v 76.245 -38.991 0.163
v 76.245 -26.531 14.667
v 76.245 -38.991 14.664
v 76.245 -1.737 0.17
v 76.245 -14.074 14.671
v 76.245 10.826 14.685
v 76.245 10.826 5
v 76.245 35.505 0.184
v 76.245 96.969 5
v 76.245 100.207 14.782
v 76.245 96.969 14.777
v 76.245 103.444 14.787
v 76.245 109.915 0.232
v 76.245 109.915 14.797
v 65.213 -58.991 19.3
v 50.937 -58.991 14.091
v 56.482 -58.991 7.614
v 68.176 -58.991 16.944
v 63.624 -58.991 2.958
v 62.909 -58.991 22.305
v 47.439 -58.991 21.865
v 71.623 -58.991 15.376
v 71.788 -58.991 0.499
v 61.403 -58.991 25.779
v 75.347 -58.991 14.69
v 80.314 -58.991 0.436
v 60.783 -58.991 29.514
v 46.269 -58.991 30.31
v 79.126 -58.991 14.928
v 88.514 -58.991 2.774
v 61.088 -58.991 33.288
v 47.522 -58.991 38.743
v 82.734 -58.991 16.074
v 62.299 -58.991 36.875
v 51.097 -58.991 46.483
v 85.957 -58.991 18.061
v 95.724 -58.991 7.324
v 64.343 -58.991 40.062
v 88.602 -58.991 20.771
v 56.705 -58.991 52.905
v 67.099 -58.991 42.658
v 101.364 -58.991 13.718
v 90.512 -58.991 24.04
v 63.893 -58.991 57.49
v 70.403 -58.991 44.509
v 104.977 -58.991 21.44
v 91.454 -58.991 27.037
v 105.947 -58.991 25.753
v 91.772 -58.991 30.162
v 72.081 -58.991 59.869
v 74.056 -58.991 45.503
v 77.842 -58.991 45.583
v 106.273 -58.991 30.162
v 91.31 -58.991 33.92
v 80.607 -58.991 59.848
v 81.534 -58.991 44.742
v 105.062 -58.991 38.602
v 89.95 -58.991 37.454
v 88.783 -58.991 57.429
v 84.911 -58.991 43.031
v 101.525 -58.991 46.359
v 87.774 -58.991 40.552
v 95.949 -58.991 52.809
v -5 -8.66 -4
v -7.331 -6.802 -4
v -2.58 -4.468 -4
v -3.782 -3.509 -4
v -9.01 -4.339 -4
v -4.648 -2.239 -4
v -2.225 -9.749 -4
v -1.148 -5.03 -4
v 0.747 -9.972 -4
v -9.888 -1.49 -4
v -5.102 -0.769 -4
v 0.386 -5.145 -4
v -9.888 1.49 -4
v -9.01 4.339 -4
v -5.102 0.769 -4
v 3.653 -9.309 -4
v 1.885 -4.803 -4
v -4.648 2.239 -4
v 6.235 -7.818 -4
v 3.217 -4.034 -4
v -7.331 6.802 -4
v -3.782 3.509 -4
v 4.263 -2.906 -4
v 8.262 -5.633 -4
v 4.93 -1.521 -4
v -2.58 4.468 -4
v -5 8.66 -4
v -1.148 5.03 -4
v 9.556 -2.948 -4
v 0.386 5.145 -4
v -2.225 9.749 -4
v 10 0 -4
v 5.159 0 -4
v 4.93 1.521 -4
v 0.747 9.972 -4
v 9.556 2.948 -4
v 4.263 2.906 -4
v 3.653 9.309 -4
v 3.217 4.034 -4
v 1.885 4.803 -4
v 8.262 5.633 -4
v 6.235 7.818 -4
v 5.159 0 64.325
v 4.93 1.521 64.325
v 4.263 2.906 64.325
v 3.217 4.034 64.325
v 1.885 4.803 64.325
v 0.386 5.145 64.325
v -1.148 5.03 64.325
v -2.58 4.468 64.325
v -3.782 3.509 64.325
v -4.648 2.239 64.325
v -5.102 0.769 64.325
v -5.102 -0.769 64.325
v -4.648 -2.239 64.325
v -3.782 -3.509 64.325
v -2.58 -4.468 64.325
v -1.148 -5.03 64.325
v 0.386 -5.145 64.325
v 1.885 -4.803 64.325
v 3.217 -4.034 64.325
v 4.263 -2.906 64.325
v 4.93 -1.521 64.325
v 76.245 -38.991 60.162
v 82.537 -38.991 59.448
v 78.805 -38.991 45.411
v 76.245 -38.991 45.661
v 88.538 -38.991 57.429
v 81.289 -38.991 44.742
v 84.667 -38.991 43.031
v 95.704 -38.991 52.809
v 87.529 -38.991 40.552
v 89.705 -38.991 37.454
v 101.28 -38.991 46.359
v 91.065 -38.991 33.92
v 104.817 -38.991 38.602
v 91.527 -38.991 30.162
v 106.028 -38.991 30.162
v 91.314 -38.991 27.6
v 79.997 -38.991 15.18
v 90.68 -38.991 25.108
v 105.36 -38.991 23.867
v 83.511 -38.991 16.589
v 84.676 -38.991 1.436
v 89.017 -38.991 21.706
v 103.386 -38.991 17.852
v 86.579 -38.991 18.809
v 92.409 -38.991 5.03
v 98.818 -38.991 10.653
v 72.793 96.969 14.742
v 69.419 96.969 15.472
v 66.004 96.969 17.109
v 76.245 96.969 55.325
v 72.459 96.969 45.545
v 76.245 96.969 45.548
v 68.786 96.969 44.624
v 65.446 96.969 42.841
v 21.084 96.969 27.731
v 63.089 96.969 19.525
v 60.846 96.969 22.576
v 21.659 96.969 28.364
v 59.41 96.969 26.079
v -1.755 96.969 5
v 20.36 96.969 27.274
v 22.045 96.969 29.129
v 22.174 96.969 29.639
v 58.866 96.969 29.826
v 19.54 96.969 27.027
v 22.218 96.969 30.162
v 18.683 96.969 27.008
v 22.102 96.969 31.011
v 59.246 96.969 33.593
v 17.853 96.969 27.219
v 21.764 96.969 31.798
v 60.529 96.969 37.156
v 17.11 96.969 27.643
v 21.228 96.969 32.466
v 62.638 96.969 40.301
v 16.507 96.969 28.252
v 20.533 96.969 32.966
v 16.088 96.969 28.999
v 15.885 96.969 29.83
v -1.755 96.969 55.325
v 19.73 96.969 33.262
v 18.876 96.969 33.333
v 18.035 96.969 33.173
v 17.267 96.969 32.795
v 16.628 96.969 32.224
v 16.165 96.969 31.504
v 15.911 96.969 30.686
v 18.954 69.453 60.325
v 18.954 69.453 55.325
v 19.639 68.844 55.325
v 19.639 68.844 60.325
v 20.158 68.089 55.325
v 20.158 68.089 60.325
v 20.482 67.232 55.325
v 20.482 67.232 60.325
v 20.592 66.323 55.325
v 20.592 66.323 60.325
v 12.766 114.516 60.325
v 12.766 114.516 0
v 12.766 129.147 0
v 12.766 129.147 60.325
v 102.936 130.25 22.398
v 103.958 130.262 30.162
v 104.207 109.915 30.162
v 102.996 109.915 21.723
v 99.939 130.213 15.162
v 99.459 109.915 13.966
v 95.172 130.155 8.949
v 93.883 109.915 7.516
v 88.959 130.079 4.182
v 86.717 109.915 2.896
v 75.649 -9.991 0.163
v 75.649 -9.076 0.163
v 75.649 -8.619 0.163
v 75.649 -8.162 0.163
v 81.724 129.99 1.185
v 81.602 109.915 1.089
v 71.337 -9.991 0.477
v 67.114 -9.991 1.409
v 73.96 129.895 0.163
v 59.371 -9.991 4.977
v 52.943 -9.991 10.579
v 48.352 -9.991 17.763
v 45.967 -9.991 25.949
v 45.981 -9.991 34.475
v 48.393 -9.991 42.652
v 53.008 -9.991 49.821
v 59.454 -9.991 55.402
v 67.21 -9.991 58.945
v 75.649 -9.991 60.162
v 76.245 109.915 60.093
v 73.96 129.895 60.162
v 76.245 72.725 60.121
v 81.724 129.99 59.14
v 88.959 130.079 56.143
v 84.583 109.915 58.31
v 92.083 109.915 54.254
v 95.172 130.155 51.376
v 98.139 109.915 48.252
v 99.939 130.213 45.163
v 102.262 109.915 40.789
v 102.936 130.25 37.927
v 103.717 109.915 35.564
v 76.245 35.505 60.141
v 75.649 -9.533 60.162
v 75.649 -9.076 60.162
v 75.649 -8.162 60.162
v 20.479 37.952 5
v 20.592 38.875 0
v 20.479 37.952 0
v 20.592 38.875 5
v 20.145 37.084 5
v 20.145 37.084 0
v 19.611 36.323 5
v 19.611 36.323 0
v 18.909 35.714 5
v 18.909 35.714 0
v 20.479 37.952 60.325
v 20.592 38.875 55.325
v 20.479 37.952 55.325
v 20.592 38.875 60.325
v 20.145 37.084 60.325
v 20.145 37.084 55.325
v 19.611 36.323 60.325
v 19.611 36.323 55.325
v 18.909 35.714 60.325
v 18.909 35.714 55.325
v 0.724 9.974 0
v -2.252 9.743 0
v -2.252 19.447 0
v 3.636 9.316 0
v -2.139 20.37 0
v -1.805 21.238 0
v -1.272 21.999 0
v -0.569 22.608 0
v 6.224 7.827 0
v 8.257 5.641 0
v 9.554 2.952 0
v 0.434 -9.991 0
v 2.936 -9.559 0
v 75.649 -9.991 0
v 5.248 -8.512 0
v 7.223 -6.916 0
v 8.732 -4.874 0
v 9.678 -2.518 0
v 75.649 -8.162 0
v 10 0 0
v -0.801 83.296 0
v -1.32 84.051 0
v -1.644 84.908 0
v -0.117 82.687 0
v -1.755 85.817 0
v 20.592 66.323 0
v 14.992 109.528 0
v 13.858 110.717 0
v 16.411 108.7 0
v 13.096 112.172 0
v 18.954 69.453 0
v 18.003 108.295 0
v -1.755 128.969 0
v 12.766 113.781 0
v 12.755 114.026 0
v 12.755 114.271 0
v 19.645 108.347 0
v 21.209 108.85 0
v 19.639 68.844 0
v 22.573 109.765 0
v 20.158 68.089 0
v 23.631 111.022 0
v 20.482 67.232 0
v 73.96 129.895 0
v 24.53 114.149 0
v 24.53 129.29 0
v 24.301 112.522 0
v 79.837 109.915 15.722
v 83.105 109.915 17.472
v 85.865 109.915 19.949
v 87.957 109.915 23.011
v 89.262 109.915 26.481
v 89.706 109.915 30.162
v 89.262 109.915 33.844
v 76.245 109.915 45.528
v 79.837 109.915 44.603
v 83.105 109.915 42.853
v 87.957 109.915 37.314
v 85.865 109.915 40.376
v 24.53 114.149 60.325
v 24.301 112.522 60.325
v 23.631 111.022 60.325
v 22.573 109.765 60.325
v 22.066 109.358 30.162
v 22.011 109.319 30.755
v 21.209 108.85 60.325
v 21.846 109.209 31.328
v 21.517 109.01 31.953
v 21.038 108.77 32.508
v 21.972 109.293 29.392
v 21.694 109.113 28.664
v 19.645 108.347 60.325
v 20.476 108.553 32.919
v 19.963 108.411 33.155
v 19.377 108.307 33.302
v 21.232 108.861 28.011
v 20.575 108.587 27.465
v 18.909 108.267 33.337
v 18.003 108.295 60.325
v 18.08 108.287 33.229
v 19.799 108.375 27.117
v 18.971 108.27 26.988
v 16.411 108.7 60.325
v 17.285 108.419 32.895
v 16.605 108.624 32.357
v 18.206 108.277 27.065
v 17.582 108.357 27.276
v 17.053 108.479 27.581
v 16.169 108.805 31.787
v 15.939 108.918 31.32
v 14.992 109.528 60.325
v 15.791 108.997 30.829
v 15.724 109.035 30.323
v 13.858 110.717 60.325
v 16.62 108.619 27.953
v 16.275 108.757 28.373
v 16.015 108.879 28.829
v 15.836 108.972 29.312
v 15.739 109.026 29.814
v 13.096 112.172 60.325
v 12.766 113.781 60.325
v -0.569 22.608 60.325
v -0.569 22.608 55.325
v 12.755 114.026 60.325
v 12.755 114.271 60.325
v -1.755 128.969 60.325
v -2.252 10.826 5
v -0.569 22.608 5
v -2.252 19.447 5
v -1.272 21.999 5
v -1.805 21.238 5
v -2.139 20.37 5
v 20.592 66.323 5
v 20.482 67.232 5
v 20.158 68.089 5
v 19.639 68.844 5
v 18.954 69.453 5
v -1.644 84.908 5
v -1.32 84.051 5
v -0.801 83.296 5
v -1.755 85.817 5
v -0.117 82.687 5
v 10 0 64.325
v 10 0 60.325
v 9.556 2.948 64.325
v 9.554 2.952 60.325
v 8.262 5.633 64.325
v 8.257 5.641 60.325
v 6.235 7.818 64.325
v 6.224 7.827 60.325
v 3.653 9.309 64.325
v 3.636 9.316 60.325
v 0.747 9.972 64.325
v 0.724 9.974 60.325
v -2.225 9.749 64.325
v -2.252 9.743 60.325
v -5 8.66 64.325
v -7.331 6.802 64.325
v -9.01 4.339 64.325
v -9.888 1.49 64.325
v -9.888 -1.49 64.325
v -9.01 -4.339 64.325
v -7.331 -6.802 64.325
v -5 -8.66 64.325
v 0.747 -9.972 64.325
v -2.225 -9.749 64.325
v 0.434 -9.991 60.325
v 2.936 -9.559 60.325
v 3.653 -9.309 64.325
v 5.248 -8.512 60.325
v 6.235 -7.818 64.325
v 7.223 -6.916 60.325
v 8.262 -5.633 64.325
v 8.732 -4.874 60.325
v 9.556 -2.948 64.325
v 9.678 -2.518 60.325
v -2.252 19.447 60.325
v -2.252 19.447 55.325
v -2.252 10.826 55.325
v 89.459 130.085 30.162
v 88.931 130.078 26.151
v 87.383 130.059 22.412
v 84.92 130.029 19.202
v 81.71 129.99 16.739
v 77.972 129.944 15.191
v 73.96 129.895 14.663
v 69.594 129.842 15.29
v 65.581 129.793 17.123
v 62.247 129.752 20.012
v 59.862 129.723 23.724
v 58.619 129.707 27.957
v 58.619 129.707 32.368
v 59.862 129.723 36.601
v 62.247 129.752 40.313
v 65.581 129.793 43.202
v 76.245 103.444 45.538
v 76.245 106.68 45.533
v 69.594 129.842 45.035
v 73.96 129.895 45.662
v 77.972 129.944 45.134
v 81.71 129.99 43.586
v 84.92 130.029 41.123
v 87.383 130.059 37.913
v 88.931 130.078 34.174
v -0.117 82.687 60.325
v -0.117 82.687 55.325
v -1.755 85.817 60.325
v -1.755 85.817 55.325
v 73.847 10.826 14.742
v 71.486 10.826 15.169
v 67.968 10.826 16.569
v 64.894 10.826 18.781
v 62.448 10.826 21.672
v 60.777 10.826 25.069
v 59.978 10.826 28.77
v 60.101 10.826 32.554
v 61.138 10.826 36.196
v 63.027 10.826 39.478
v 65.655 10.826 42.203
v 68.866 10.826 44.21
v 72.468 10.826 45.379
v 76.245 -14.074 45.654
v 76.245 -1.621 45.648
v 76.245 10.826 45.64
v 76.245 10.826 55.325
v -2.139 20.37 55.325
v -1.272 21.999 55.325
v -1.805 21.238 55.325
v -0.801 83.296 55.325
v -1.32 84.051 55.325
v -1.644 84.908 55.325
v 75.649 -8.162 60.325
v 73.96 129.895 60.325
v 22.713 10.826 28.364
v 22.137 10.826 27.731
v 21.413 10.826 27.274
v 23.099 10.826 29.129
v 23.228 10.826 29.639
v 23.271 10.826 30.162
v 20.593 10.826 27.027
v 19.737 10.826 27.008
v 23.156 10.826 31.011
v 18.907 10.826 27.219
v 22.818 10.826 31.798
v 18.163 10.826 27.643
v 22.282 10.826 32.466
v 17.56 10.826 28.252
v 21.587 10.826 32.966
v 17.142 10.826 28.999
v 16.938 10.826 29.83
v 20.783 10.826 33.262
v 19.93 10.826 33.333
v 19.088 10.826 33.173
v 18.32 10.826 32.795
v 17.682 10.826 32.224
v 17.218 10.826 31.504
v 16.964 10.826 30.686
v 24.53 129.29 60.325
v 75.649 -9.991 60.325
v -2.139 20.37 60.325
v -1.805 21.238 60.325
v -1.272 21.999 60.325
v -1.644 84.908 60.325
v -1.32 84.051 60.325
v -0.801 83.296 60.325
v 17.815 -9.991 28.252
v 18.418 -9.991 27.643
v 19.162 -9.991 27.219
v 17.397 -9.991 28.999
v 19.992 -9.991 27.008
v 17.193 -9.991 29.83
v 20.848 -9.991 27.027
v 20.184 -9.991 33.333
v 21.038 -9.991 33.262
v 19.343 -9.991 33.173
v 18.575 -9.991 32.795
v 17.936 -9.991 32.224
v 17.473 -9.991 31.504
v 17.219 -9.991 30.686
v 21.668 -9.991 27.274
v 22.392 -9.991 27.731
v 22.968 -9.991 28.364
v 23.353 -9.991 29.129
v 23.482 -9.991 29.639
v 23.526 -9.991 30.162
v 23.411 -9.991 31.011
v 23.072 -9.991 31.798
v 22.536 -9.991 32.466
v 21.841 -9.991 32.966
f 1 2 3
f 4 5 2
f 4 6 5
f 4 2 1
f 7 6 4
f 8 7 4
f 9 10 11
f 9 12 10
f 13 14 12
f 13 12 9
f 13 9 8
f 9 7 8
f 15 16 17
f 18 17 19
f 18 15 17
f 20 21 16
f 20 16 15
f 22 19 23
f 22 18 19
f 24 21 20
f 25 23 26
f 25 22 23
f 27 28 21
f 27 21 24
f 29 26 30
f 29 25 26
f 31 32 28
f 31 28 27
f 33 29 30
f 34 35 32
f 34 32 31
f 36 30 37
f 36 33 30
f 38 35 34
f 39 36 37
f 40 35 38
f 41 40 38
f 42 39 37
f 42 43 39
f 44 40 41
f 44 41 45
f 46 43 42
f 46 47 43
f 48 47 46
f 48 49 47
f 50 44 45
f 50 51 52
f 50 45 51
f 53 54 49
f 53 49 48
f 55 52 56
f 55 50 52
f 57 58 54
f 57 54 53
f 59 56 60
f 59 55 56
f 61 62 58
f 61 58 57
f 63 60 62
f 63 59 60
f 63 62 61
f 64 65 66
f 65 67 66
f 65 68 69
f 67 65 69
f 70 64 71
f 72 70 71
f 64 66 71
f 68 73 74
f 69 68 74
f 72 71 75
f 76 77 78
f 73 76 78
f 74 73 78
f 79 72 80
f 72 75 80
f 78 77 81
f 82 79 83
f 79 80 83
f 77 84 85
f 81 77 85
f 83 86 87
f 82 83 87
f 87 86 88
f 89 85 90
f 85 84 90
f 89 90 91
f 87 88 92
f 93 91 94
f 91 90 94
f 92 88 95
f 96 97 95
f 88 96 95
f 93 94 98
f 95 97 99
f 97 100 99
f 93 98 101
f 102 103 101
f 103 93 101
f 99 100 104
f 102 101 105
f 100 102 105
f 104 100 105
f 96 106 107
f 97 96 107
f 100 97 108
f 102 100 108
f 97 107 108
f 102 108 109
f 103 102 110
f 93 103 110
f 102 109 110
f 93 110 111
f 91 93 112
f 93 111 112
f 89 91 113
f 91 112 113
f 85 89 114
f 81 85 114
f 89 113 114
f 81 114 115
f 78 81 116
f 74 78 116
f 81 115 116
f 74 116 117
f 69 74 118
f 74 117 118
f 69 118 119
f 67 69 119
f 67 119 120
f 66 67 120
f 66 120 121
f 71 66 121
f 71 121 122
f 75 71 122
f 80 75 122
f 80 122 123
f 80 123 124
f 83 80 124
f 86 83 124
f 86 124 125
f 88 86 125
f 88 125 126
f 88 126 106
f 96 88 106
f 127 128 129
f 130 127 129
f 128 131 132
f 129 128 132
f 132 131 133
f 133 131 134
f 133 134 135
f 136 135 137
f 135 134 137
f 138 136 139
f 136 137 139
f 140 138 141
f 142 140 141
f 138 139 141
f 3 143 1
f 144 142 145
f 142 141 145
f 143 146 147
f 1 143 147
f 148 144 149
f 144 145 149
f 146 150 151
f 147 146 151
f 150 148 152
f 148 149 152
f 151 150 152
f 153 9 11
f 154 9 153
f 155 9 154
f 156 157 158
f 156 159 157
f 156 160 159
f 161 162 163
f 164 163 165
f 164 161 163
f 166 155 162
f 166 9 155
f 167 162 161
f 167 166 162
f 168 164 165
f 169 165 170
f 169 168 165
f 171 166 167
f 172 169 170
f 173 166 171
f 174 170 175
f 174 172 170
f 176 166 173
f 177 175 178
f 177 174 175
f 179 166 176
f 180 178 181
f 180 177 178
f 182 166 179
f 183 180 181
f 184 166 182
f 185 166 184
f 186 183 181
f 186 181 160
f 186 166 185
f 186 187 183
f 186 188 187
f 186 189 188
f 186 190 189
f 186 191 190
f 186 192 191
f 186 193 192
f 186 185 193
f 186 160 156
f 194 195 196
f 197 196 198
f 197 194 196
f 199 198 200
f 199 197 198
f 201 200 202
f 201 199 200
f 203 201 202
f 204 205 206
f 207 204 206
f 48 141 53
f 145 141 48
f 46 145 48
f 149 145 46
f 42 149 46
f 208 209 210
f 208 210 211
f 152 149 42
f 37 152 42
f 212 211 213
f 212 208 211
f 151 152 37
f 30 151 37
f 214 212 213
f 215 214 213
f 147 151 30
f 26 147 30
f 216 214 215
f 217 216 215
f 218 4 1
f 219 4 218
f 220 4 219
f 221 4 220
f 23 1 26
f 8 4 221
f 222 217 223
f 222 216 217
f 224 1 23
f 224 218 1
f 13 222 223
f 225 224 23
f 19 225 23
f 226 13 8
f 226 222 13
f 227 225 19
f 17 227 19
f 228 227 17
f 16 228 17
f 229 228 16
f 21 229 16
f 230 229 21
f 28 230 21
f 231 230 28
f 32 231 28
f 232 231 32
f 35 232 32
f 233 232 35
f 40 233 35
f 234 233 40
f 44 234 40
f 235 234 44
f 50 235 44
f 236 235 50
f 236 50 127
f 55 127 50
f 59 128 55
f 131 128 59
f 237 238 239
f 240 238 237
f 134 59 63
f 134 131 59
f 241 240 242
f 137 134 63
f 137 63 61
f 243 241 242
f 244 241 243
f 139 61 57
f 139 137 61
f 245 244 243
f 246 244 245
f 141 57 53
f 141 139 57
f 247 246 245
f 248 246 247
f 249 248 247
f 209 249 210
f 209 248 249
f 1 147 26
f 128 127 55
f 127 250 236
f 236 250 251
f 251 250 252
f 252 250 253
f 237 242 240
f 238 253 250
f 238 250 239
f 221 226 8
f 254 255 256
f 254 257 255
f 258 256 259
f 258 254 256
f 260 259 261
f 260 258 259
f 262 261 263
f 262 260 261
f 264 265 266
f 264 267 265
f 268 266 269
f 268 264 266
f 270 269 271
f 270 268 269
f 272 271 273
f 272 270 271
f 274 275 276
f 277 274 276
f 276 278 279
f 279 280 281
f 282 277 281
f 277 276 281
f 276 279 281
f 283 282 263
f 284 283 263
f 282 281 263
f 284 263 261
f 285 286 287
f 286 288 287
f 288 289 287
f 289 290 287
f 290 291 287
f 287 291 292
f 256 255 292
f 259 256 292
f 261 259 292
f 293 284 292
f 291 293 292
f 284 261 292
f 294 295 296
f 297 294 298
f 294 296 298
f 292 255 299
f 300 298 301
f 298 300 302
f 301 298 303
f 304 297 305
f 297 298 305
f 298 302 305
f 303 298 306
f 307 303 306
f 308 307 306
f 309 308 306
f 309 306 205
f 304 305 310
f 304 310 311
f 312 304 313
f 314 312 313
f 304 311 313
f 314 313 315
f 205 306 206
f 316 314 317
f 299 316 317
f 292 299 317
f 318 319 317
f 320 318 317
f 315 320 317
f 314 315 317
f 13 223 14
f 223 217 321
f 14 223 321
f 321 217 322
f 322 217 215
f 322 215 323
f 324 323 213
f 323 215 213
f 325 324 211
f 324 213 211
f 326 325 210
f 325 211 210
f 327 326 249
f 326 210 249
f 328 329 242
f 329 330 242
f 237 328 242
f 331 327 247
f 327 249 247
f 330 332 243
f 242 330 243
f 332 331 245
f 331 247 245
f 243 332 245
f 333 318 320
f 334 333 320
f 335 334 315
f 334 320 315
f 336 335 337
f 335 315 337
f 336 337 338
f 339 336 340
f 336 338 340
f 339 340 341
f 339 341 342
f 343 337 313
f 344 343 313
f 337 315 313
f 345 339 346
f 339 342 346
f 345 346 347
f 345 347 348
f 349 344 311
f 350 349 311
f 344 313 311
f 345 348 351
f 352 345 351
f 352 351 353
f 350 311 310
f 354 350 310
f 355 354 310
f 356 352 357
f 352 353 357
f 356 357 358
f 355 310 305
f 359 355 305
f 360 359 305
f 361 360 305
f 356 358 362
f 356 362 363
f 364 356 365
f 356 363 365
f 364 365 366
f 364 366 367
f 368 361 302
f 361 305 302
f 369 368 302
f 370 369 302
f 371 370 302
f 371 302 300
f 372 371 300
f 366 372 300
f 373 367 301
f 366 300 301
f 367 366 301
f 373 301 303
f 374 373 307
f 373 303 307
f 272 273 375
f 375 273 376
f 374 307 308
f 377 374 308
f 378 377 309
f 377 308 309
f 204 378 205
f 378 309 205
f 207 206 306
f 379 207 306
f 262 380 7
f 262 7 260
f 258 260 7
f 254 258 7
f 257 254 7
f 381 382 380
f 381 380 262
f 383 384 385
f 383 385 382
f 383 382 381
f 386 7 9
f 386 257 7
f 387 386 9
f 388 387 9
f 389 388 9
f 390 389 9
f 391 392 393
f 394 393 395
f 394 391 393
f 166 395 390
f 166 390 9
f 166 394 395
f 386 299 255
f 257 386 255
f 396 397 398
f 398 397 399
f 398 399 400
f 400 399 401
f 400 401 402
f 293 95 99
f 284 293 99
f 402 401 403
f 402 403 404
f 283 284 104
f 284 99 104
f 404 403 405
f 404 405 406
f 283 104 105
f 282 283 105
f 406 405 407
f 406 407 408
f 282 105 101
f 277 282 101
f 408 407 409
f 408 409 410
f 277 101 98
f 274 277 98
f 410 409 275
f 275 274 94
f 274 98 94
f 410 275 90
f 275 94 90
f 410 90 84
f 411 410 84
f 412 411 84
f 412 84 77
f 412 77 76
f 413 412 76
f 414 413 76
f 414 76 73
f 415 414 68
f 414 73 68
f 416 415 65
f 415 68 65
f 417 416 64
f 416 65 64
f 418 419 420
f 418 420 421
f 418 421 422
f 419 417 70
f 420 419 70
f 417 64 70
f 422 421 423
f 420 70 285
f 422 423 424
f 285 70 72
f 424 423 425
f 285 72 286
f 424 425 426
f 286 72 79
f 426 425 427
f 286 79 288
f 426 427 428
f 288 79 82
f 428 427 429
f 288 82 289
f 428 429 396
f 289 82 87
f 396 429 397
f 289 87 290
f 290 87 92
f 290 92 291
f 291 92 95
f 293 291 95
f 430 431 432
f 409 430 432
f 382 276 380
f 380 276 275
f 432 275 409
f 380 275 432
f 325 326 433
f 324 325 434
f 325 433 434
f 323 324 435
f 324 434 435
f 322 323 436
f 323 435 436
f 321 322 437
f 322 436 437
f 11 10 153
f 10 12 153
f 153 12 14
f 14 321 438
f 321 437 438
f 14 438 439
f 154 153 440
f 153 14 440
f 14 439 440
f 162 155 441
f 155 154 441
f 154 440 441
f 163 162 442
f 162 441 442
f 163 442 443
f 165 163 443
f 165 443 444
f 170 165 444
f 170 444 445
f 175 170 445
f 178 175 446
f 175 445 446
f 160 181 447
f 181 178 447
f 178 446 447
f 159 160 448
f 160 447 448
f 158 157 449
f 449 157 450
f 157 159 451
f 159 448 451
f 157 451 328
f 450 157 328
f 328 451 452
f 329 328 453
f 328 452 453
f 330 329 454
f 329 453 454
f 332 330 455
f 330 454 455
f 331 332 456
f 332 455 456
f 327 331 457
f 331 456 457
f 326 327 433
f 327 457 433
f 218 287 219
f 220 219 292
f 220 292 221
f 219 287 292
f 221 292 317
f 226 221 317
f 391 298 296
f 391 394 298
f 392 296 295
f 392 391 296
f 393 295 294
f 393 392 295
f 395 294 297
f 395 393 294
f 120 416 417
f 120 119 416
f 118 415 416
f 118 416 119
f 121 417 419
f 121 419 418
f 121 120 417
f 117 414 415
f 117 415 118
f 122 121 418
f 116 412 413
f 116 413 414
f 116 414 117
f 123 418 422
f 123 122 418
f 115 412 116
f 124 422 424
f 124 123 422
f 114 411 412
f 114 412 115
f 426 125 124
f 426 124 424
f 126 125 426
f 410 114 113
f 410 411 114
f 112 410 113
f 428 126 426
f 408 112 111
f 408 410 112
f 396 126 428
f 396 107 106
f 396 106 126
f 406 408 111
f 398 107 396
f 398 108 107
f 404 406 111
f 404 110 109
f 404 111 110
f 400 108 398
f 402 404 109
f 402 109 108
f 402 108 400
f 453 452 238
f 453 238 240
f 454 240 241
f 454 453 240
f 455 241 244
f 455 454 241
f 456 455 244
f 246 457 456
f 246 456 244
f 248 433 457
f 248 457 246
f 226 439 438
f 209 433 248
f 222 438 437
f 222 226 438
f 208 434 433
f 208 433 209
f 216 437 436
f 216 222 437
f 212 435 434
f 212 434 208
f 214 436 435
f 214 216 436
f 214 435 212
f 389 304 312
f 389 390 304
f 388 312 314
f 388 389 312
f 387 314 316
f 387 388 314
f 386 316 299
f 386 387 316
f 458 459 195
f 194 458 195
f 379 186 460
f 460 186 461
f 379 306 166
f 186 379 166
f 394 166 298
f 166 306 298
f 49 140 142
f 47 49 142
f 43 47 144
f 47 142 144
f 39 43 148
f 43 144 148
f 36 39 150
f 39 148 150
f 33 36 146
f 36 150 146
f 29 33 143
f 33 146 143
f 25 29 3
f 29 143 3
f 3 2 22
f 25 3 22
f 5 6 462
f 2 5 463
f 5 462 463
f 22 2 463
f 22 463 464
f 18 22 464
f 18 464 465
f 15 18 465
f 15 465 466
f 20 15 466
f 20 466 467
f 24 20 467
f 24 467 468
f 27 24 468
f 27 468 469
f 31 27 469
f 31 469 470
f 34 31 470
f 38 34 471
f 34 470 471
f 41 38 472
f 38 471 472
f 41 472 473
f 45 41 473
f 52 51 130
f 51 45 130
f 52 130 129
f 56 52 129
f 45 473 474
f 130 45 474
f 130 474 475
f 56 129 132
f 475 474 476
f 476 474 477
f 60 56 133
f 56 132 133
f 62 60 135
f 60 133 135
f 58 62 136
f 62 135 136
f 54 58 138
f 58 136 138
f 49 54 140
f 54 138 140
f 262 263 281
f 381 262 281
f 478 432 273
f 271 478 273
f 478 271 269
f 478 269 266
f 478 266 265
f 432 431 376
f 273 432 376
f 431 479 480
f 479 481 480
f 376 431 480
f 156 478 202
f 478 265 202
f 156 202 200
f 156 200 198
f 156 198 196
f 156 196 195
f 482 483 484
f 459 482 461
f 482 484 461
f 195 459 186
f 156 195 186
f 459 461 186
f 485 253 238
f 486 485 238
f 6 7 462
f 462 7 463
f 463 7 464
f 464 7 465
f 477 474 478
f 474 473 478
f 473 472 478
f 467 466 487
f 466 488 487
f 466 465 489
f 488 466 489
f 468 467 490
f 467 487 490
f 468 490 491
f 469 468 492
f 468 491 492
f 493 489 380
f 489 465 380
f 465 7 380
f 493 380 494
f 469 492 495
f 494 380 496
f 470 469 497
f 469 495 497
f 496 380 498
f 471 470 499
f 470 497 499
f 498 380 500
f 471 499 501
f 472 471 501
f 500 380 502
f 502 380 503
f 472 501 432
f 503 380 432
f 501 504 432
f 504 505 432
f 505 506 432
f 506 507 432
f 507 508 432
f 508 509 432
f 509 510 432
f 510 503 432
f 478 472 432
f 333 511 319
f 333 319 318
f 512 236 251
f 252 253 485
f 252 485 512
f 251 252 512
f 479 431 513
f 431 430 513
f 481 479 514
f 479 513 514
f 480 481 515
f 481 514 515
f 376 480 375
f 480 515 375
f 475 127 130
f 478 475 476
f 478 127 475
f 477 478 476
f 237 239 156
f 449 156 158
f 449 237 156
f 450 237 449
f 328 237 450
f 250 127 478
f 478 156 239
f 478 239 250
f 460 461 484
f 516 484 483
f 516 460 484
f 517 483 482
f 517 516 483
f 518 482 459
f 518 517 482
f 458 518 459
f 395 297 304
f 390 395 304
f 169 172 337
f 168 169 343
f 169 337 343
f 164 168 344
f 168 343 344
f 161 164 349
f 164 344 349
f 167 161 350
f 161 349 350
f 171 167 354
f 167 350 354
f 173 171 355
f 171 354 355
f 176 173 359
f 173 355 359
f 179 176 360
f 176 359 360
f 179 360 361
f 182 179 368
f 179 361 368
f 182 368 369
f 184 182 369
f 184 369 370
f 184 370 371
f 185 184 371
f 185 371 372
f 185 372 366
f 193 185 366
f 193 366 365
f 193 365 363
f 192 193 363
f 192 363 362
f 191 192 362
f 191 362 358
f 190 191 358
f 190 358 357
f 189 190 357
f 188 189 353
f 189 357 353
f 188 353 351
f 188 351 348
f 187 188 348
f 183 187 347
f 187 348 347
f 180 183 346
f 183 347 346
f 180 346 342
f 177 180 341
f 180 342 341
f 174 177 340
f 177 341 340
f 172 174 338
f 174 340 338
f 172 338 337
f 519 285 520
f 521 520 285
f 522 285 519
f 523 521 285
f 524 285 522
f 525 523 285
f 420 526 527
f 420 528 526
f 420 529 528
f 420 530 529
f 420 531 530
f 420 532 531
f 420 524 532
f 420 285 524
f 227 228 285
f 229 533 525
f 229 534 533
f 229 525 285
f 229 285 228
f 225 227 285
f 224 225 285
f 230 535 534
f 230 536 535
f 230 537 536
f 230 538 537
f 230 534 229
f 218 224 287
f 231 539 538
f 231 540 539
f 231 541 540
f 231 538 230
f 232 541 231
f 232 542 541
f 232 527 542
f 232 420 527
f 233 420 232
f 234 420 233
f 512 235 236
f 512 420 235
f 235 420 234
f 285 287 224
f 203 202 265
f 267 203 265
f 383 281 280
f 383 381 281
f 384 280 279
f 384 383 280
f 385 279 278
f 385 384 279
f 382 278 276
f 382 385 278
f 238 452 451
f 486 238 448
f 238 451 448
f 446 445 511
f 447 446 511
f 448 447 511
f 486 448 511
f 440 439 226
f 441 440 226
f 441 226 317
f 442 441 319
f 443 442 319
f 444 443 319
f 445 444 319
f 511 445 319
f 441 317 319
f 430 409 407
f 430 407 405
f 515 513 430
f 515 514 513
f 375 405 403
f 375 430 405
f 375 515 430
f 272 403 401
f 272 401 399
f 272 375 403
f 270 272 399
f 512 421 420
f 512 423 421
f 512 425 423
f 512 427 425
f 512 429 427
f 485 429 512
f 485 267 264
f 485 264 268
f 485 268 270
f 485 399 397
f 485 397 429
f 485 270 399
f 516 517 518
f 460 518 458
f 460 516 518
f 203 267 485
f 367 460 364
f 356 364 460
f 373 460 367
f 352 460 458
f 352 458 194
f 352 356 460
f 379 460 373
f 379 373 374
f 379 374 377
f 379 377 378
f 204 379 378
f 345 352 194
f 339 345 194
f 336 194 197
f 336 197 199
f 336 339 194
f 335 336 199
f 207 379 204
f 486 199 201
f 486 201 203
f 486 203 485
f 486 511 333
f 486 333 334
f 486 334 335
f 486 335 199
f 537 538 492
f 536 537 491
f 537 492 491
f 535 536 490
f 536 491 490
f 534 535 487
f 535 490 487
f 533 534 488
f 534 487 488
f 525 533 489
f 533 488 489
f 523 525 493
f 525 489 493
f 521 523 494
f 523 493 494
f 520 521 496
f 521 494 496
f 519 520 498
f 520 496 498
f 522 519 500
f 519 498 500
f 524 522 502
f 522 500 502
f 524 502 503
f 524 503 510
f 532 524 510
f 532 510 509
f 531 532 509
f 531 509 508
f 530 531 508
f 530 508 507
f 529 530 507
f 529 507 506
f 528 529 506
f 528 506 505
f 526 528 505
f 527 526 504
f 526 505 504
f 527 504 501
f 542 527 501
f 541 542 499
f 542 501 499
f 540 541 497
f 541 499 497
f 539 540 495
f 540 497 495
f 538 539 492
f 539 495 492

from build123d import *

# Parameters (mm, degrees)
BOSS_EXTRUDE1_DEPTH               = 60.325
BOSS_EXTRUDE2_START               = -64.325
SKETCH4_R                         = 10
BOSS_EXTRUDE2_DEPTH               = 68.325
SKETCH5_R                         = 5.159375
CUT_EXTRUDE1_DEPTH                = 69.325
SKETCH6_W                         = 75.649114878
SKETCH6_H                         = 60.325
BOSS_EXTRUDE3_DEPTH               = 1.8288
BOSS_EXTRUDE4_REACH               = 190.905
BOSS_EXTRUDE4_OFFSET_FROM_SURFACE = 49
SKETCH8_R                         = 30
SKETCH9_R                         = 15.5
CUT_EXTRUDE2_DEPTH                = 190.266787166
CUT_EXTRUDE3_DEPTH                = 49
SKETCH11_W                        = 50.325
SKETCH11_H                        = 86.143116626
CUT_EXTRUDE4_DEPTH                = 109.525496818
SKETCH15_R                        = 3.175
CUT_EXTRUDE5_DEPTH                = 190.266787166
FILLET1_R                         = 3.81


with BuildPart() as part:
    # Sketch2 → Boss-Extrude1 (new body)
    with BuildSketch(Plane.XY):
        with BuildLine():
            Line((12.765629792, 129.146573189), (-1.754589441, 128.968962917))
            Line((-1.754589441, 128.968962917), (-1.754589441, 83.82382539))
            Line((-1.754589441, 83.82382539), (20.592124083, 68.316599476))
            Line((20.592124083, 68.316599476), (20.592124083, 36.846052768))
            Line((20.592124083, 36.846052768), (-2.252403515, 21.475974179))
            Line((-2.252403515, 21.475974179), (-2.252403515, 12.414958495))
            Line((-2.252403515, 12.414958495), (-2.252403515, -8.161795964))
            Line((-2.252403515, -8.161795964), (75.649114878, -8.161795964))
            Line((75.649114878, -8.161795964), (73.96041286, 129.895103354))
            Line((73.96041286, 129.895103354), (24.530310461, 129.290477913))
            Line((24.530310461, 129.290477913), (24.530310461, 114.148644142))
            ThreePointArc((24.530310461, 114.148644142), (18.82597029, 108.263437866), (12.765629792, 113.781356201))
            ThreePointArc((12.765629792, 113.781356201), (12.754163231, 114.148644142), (12.765629792, 114.515932083))
            Line((12.765629792, 114.515932083), (12.765629792, 129.146573189))
        make_face()
    extrude(amount=BOSS_EXTRUDE1_DEPTH)

    # Sketch4 → Boss-Extrude2 (add)
    with BuildSketch(Plane.XY.offset(60.325).offset(BOSS_EXTRUDE2_START)):
        Circle(SKETCH4_R)
    extrude(amount=BOSS_EXTRUDE2_DEPTH)

    # Sketch5 → Cut-Extrude1 (cut, through all)
    with BuildSketch(Plane.XY.offset(64.325)):
        Circle(SKETCH5_R)
    extrude(amount=-CUT_EXTRUDE1_DEPTH, mode=Mode.SUBTRACT)

    # Sketch6 → Boss-Extrude3 (add)
    with BuildSketch(Plane.XZ.offset(8.161795964)):
        with Locations((37.824557439, 30.1625)):
            Rectangle(SKETCH6_W, SKETCH6_H)
    extrude(amount=BOSS_EXTRUDE3_DEPTH)

    # Boss-Extrude4: up to this face of the body (flat: up to its plane, moved by the offset)
    boss_extrude4_end = Plane(part.part.faces().sort_by_distance((38.041347827, -9.990595964, 30.1625))[0]).offset(BOSS_EXTRUDE4_OFFSET_FROM_SURFACE)
    # Sketch8 → Boss-Extrude4 (add, up to the picked face)
    with BuildSketch(Plane(origin=(-1.577565522, 128.97112826, 0), x_dir=(0.999925198, 0.012231013, 0), z_dir=(-0.012231013, 0.999925198, 0)), mode=Mode.PRIVATE) as boss_extrude4_sk1:
        with Locations((75.543629169, -30.1625)):
            Circle(SKETCH8_R)
    boss_extrude4_tool1 = split(extrude(boss_extrude4_sk1.sketch, amount=-BOSS_EXTRUDE4_REACH, mode=Mode.PRIVATE), bisect_by=boss_extrude4_end, keep=Keep.BOTH, mode=Mode.PRIVATE)
    add(boss_extrude4_tool1.solids().sort_by_distance((73.960413, 129.895103, 30.1625))[0])

    # Sketch9 → Cut-Extrude2 (cut, through all)
    with BuildSketch(Plane(origin=(-1.577565522, 128.97112826, 0), x_dir=(0.999925198, 0.012231013, 0), z_dir=(-0.012231013, 0.999925198, 0))):
        with Locations((75.543629169, -30.1625)):
            Circle(SKETCH9_R)
    extrude(amount=-CUT_EXTRUDE2_DEPTH, mode=Mode.SUBTRACT)

    # Sketch10 → Cut-Extrude3 (cut)
    with BuildSketch(Plane.ZY.offset(-125.245410559)):
        Polygon((60.325, 109.914722857), (60.1625, -38.990595964), (-4.123053696, -38.990595964), (-4.123053696, 109.914722857), align=None)
    extrude(amount=CUT_EXTRUDE3_DEPTH, mode=Mode.SUBTRACT)

    # Sketch11 → Cut-Extrude4 (cut, through all)
    with BuildSketch(Plane.ZY.offset(2.252403515)):
        with Locations((30.1625, 53.897404604)):
            Rectangle(SKETCH11_W, SKETCH11_H)
    extrude(amount=-CUT_EXTRUDE4_DEPTH, mode=Mode.SUBTRACT)

    # Sketch15 → Cut-Extrude5 (cut, through all)
    with BuildSketch(Plane(origin=(-1.577565522, 128.97112826, 0), x_dir=(0.999925198, 0.012231013, 0), z_dir=(-0.012231013, 0.999925198, 0))):
        with Locations((20.227048665, -30.1625)):
            Circle(SKETCH15_R)
    extrude(amount=-CUT_EXTRUDE5_DEPTH, mode=Mode.SUBTRACT)

    # Fillet1
    fillet1_edges = [part.edges().sort_by_distance(p)[0] for p in [
        (-2.252403515, 21.475974179, 2.5),
        (20.592124083, 36.846052768, 2.5),
        (20.592124083, 68.316599476, 2.5),
        (-1.754589441, 83.82382539, 2.5),
        (-2.252403515, 21.475974179, 57.825),
        (20.592124083, 36.846052768, 57.825),
        (20.592124083, 68.316599476, 57.825),
        (-1.754589441, 83.82382539, 57.825),
    ]]
    fillet(fillet1_edges, radius=FILLET1_R)


solid = part.part
